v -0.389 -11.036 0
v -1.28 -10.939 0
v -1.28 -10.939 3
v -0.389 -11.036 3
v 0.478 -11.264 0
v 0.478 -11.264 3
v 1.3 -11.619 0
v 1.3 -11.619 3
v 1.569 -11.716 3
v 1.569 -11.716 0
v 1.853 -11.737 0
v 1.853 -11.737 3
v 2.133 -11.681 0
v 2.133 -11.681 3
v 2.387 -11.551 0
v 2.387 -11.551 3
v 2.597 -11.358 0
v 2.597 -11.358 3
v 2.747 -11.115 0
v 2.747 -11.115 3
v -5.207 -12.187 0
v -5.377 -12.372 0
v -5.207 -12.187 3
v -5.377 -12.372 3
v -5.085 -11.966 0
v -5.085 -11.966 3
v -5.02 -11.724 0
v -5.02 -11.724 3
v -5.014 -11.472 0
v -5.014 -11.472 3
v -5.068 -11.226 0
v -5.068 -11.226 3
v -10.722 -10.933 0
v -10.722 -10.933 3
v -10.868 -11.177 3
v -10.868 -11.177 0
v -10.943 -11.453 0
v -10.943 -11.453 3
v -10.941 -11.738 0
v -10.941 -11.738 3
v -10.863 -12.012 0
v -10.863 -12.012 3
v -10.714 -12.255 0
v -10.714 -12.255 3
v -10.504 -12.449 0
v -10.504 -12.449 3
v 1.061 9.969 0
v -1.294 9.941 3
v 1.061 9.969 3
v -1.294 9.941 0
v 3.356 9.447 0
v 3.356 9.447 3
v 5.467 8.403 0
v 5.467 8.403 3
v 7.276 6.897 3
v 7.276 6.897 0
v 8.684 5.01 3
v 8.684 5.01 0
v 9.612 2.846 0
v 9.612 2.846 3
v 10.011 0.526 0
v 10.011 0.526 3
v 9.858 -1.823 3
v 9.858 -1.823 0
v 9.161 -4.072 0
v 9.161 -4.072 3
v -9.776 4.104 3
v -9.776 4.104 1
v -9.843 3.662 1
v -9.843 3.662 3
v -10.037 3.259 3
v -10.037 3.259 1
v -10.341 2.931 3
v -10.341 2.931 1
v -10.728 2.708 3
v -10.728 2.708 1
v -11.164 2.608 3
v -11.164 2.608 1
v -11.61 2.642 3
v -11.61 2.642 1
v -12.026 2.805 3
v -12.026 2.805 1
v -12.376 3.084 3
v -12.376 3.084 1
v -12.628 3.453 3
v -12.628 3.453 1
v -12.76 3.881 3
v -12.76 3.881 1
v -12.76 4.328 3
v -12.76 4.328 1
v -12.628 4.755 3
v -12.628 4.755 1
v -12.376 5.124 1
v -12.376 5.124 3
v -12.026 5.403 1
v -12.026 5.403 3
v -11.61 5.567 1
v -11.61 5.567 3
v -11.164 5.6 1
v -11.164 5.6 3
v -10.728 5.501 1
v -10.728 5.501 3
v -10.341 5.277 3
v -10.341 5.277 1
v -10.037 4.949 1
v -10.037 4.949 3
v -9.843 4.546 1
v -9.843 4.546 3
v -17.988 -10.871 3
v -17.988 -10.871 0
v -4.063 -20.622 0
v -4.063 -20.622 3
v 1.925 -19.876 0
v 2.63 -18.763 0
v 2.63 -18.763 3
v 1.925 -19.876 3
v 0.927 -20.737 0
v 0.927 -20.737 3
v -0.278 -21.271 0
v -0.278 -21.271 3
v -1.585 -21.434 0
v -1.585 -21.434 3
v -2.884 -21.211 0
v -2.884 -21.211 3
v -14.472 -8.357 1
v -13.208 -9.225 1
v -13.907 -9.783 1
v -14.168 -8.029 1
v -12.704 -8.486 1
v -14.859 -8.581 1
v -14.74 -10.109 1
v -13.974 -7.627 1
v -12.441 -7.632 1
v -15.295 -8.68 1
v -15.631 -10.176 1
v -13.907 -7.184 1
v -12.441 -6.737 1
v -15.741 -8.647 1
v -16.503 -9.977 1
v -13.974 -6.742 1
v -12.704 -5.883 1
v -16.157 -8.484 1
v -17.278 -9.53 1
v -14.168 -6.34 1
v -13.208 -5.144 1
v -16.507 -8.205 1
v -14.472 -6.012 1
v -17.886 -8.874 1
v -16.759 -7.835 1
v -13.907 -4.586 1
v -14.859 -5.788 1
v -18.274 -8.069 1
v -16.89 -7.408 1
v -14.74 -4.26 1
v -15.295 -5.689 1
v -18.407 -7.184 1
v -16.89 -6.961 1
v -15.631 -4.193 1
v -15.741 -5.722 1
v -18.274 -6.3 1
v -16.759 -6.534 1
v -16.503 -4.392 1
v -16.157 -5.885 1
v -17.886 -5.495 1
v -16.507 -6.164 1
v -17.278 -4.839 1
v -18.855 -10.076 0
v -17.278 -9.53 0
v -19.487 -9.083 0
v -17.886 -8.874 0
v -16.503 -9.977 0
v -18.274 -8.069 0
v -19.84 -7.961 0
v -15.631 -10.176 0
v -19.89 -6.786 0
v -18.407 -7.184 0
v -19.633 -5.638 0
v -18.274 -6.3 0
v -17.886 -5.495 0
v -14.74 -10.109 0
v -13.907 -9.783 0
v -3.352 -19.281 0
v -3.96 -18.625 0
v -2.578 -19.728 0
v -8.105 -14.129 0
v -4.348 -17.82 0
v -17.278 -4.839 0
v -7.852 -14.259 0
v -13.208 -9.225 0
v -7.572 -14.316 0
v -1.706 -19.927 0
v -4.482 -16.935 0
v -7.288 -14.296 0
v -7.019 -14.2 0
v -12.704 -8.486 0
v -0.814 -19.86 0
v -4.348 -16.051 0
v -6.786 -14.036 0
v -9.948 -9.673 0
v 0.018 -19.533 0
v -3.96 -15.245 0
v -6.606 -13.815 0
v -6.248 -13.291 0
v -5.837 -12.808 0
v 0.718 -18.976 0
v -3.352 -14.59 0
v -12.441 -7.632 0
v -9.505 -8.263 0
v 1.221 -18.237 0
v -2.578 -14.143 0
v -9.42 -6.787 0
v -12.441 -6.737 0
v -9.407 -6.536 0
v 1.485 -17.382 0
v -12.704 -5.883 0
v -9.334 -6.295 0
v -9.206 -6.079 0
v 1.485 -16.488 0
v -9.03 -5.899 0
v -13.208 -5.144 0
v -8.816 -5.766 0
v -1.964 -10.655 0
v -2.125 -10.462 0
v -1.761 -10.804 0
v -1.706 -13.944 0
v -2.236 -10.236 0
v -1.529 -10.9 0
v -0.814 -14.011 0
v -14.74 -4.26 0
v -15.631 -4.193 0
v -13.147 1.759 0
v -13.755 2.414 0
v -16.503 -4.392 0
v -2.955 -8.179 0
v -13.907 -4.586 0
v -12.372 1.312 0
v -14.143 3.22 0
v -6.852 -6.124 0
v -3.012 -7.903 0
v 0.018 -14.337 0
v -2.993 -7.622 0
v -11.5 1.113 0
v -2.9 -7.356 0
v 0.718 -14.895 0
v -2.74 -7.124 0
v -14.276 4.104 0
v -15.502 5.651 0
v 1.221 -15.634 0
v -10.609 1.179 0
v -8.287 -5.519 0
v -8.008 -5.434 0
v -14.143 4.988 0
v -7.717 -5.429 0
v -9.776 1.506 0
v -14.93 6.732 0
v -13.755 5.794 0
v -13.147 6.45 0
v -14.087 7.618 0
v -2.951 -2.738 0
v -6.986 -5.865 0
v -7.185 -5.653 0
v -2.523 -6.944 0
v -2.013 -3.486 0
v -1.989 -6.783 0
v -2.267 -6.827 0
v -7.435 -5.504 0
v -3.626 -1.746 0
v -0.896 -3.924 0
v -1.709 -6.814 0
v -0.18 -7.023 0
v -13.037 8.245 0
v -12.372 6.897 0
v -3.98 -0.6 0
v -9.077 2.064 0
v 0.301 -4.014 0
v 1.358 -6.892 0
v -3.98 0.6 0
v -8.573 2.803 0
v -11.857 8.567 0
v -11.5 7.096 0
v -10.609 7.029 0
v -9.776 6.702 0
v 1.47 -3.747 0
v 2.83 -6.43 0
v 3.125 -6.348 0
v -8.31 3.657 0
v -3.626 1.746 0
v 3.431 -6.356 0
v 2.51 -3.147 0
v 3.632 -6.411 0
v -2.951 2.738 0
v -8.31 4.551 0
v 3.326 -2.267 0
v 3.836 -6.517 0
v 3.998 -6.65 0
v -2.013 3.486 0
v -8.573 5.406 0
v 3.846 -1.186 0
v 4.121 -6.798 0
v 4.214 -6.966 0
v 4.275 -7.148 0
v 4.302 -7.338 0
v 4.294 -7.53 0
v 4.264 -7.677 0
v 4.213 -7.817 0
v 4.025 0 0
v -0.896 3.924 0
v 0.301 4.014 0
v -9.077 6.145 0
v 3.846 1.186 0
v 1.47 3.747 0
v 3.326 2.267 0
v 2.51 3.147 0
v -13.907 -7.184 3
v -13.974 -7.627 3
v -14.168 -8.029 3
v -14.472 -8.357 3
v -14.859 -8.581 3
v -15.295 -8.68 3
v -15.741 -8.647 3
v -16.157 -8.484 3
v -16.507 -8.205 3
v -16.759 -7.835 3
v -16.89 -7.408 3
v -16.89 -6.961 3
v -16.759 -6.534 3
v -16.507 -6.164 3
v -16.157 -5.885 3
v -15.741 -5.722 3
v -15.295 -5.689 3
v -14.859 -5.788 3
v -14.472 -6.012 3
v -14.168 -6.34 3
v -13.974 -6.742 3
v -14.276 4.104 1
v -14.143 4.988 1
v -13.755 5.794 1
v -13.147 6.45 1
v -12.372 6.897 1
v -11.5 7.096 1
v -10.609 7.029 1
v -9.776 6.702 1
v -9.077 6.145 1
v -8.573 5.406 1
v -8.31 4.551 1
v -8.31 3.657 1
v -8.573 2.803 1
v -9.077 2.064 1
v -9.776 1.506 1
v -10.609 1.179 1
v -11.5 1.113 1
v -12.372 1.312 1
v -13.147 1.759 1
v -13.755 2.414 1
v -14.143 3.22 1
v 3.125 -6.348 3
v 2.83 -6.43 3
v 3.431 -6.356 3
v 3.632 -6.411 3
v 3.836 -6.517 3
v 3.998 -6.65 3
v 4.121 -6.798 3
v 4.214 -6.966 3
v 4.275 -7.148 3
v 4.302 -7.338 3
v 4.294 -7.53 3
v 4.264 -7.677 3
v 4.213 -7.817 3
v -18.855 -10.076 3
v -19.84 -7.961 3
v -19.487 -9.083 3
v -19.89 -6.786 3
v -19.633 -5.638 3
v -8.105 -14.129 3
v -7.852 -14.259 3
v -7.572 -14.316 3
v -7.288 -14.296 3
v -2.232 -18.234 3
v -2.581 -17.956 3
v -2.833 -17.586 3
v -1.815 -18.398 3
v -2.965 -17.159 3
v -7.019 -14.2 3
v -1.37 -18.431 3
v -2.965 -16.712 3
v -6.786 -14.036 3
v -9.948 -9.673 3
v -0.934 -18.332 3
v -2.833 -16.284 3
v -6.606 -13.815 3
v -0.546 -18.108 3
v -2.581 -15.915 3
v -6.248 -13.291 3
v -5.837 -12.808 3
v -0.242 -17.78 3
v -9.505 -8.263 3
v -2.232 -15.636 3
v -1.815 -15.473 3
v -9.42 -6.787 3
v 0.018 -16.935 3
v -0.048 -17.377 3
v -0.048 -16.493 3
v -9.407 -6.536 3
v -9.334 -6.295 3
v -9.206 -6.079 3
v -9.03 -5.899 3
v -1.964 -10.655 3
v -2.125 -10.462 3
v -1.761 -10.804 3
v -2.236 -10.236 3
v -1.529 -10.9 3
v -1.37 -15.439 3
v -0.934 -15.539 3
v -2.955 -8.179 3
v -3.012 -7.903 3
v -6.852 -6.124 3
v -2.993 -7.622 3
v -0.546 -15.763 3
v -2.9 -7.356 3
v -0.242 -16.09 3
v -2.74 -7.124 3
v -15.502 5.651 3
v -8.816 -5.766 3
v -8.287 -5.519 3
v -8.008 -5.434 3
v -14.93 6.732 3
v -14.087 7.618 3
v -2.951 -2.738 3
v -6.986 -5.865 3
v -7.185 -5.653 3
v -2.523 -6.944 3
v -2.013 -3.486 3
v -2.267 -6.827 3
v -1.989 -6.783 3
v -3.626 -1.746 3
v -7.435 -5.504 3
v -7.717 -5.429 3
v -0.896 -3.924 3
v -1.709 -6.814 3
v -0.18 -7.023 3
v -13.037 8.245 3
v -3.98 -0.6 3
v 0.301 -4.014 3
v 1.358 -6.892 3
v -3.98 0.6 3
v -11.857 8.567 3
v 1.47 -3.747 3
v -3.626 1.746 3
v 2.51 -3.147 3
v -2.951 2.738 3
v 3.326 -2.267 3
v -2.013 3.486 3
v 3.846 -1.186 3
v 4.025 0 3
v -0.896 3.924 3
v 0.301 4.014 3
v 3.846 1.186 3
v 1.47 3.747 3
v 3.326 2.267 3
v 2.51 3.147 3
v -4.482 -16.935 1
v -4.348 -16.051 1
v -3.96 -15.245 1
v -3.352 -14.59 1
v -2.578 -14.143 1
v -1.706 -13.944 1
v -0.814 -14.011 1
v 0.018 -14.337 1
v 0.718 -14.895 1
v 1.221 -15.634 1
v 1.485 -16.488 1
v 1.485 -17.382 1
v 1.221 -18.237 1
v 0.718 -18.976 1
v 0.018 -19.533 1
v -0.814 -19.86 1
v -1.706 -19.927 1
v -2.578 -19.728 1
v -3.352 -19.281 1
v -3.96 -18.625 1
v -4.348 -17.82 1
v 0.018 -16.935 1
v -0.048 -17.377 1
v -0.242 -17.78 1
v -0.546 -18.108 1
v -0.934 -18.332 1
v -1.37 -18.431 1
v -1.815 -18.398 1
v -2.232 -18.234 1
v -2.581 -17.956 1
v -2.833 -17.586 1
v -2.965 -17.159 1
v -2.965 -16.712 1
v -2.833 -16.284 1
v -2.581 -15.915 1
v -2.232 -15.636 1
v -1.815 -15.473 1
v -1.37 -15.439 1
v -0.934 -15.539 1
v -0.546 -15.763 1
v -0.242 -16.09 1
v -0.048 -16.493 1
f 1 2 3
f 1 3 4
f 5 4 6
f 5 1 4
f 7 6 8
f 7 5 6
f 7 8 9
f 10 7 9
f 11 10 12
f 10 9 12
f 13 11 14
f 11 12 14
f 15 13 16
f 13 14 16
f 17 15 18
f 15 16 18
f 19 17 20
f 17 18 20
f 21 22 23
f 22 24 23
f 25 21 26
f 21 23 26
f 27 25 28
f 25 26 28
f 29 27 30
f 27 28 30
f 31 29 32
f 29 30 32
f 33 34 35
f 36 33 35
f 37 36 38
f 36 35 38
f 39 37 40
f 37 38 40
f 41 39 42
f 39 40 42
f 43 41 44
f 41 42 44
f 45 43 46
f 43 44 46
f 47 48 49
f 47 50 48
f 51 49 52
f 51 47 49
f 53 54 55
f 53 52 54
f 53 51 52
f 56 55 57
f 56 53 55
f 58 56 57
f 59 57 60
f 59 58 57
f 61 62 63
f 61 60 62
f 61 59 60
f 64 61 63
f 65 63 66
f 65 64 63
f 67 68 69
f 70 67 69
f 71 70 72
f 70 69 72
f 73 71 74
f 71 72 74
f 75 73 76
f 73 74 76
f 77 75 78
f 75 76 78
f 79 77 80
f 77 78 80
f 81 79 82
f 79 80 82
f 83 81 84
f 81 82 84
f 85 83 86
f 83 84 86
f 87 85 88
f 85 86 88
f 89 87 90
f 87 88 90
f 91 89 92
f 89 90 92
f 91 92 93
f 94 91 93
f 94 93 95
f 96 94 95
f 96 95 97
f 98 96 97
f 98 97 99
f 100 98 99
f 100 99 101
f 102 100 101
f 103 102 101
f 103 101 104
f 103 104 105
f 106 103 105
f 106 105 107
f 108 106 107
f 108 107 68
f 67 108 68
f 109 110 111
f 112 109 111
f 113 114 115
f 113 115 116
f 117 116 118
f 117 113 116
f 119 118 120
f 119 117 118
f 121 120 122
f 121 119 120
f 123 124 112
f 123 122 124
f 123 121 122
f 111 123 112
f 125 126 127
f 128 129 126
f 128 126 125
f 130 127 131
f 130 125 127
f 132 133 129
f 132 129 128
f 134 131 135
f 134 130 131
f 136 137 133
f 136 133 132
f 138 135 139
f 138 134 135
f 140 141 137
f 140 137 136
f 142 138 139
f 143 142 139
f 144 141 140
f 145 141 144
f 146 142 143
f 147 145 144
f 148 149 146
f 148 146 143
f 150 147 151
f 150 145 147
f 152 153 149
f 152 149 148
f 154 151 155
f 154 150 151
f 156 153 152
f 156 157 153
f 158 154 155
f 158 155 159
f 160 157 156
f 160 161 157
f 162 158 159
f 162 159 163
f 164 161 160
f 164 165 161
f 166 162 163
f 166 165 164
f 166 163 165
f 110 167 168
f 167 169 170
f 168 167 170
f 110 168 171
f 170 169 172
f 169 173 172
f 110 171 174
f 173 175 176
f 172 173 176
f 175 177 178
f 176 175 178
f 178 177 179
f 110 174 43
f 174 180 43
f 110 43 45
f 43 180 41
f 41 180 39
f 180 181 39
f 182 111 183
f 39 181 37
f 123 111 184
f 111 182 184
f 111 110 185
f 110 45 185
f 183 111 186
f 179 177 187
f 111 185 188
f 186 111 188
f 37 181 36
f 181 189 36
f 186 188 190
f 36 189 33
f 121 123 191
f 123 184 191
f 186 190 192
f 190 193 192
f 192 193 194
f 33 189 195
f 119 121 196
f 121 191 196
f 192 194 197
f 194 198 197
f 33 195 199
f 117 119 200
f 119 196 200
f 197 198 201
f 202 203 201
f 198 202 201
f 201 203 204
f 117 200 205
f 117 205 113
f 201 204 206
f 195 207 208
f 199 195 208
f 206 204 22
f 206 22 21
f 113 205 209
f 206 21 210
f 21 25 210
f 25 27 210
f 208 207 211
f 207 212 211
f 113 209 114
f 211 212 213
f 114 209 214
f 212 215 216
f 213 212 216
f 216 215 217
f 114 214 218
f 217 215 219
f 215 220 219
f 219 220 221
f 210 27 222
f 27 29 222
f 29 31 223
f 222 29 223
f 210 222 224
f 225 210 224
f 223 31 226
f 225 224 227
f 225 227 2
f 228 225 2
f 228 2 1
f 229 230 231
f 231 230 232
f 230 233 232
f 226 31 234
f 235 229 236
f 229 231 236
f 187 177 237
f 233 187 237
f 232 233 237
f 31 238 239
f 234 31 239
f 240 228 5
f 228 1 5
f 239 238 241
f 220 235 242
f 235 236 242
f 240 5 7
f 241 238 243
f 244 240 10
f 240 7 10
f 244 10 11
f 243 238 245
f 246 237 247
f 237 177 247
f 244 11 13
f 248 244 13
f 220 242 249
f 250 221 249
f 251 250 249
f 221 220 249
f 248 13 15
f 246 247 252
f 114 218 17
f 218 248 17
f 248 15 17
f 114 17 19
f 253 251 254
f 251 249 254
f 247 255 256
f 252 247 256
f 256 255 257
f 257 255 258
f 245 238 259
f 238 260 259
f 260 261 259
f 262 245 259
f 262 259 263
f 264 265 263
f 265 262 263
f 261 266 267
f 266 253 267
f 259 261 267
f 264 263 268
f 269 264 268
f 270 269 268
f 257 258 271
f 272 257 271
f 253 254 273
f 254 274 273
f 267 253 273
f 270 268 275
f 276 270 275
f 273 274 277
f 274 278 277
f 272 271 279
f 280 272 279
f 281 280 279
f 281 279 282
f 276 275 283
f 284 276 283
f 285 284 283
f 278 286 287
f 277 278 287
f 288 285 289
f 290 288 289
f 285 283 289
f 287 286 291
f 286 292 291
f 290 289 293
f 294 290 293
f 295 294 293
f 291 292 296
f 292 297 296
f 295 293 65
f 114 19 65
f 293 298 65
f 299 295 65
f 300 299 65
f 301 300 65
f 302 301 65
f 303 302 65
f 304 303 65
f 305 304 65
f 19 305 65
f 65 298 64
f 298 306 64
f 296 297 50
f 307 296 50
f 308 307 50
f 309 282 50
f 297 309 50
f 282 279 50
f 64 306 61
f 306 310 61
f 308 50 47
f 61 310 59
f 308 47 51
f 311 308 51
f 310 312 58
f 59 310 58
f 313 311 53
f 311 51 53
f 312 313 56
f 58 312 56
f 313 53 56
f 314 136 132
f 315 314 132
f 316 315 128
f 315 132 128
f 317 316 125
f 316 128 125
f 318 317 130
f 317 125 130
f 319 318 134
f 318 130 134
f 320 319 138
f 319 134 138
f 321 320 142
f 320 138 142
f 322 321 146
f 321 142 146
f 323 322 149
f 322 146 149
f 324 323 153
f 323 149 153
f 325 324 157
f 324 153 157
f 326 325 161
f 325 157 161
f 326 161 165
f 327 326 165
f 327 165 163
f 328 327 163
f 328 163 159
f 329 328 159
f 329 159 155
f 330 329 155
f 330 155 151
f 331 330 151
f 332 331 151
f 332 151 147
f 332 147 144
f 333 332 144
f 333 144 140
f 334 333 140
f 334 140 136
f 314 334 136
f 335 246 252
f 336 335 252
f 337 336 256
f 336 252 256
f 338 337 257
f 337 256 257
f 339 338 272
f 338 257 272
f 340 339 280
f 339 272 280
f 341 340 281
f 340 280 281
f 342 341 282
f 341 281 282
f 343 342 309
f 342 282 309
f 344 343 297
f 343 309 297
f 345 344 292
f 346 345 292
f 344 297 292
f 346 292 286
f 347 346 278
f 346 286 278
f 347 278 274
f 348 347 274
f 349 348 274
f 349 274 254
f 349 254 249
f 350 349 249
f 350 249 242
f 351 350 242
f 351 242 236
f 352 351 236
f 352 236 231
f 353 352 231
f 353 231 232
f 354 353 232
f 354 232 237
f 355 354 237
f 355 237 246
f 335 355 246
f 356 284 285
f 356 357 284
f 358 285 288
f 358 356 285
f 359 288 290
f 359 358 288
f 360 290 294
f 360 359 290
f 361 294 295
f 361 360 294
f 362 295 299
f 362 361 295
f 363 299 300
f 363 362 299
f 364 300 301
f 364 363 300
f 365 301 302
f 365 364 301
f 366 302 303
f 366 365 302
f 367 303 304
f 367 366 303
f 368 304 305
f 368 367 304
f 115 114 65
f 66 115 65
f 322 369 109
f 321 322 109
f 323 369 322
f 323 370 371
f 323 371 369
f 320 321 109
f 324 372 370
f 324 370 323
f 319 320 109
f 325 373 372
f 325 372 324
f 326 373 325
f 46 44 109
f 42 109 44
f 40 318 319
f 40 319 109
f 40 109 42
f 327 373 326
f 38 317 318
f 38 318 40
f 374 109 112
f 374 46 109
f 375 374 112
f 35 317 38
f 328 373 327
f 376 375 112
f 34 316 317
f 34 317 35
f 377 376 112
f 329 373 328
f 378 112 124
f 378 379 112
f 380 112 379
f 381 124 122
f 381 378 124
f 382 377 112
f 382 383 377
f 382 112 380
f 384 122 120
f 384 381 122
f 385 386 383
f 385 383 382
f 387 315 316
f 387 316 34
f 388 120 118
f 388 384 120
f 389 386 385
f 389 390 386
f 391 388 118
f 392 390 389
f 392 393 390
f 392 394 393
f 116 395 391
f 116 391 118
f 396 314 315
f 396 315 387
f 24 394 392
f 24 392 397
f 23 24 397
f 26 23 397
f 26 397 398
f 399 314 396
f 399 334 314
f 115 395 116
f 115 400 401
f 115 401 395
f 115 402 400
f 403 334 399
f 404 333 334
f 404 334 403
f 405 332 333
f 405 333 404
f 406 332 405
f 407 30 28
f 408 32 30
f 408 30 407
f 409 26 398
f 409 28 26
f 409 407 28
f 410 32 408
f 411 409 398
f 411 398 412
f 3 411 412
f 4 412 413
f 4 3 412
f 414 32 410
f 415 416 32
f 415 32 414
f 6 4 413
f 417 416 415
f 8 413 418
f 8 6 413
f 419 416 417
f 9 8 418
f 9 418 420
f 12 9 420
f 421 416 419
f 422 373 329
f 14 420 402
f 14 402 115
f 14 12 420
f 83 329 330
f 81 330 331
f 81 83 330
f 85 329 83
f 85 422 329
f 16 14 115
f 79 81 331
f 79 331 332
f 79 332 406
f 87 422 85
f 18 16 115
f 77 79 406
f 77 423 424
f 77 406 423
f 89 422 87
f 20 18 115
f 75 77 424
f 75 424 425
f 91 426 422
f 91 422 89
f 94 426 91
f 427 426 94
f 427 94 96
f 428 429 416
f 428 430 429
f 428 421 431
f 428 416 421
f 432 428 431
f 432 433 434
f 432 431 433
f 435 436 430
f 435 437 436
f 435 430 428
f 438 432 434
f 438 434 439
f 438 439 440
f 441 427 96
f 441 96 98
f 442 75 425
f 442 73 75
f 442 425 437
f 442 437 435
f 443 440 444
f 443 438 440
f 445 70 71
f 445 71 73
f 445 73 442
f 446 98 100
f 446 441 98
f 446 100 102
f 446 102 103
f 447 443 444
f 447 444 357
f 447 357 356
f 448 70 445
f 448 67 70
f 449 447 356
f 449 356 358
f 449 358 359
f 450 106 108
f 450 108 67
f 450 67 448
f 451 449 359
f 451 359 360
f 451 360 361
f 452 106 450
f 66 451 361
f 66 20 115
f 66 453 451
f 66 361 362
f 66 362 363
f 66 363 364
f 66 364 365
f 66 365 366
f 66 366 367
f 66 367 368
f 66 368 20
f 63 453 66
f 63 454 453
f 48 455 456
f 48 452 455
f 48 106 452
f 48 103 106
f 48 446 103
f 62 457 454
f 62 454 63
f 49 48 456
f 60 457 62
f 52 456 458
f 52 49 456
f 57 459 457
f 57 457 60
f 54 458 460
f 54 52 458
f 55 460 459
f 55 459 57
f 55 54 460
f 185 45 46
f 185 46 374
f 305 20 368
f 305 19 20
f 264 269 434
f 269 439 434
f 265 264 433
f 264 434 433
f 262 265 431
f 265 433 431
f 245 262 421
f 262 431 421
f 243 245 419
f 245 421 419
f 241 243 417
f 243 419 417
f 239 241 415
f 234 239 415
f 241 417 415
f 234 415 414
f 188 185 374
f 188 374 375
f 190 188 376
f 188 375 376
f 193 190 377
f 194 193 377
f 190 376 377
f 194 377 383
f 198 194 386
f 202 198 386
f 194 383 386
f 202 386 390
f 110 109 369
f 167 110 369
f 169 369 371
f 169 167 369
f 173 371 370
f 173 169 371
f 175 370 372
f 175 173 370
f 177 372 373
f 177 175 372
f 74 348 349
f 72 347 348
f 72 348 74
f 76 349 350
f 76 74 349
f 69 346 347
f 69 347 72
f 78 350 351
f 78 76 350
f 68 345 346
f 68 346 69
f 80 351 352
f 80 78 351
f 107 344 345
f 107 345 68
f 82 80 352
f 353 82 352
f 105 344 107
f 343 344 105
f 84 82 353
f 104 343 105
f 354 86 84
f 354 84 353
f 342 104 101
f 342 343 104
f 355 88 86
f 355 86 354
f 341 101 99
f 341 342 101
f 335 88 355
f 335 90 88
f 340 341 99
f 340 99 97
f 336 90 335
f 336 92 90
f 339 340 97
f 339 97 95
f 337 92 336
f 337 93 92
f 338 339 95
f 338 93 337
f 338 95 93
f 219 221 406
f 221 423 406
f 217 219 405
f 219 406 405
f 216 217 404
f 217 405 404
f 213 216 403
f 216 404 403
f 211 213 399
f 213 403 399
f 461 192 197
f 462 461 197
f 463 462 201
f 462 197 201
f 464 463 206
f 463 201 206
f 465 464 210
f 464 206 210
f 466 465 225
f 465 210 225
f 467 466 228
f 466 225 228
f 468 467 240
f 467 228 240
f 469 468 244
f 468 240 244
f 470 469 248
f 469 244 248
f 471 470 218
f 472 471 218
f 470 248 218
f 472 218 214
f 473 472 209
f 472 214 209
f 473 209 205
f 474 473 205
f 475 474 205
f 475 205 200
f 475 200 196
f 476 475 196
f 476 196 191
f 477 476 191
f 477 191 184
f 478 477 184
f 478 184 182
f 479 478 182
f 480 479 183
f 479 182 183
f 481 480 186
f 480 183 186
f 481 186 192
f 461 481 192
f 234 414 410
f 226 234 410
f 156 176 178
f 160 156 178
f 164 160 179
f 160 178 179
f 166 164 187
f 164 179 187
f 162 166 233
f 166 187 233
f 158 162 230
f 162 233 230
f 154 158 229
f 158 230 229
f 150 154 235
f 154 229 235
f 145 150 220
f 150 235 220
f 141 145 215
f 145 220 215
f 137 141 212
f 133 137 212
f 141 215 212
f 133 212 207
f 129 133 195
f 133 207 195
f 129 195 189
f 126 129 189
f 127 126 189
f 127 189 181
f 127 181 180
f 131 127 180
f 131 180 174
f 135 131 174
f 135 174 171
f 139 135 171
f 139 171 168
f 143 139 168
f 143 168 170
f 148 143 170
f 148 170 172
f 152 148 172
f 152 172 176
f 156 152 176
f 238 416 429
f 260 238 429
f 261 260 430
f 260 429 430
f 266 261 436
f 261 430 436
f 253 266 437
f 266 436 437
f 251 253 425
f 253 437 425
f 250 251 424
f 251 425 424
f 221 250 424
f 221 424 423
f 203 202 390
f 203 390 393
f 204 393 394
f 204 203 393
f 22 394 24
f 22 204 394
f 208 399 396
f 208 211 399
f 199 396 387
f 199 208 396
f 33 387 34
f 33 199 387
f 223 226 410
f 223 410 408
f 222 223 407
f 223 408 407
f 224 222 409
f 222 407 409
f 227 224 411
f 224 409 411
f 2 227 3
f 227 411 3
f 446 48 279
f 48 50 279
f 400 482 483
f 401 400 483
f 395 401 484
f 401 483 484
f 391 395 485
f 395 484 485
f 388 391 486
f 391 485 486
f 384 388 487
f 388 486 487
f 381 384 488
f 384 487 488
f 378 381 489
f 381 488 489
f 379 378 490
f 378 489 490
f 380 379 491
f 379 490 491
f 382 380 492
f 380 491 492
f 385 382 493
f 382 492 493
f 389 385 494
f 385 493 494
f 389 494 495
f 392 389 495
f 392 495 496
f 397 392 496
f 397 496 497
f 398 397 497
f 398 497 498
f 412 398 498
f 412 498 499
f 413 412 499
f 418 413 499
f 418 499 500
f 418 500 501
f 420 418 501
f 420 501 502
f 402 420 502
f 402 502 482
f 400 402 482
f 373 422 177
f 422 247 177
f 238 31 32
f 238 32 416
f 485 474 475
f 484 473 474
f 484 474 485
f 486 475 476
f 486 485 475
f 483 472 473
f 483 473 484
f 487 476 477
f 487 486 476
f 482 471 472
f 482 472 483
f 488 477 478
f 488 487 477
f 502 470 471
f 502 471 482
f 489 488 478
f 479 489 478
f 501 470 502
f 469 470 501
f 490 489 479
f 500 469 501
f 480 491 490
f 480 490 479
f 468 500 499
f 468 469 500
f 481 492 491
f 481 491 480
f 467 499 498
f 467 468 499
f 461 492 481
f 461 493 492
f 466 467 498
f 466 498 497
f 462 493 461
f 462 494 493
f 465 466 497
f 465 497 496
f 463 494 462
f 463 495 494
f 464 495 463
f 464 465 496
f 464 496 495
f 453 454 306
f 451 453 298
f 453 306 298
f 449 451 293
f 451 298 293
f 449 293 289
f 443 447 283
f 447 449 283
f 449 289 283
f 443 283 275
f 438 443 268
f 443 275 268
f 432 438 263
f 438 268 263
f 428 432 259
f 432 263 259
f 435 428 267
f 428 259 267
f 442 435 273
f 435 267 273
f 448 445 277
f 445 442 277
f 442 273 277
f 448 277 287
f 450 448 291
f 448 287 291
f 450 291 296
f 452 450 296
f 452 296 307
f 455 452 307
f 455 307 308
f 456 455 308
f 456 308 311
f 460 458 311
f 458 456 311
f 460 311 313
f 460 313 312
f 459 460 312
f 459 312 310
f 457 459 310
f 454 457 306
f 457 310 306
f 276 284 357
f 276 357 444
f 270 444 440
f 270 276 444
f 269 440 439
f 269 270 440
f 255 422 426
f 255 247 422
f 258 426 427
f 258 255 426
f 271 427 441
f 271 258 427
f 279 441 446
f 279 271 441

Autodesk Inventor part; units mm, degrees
ref_plane "YZ Plane" through (0, 0, 0) normal (1, 0, 0) x (0, 1, 0)
ref_plane "XZ Plane" through (0, 0, 0) normal (0, 1, 0) x (-1, 0, 0)
ref_plane "XY Plane" through (0, 0, 0) normal (0, 0, 1) x (1, 0, 0)
sketch "スケッチ1" plane through (0, 0, 0) normal (0, 0, 1) x (1, 0, 0)
  circle A0 centre (0, 0) radius 4.025
  line L0 (0, 0) -> (0, -4.025)
  line L1 (0, 0) -> (-1.4816, -16.9353)
  circle A1 centre (-1.4816, -16.9353) radius 1.5
  line L2 (0, 0) -> (-15.4072, -7.1845)
  circle A2 centre (-15.4072, -7.1845) radius 1.5
  line L3 (0, 0) -> (-11.2763, 4.1042)
  circle A3 centre (-11.2763, 4.1042) radius 1.5
  circle A4 centre (0, 0) radius 7.025
  circle A5 centre (0, 0) radius 10.025
  circle A6 centre (-11.2763, 4.1042) radius 4.5
  circle A7 centre (-15.4072, -7.1845) radius 4.5
  circle A8 centre (-1.4816, -16.9353) radius 4.5
  line L4 (-15.5023, 5.6507) -> (-19.6332, -5.6381)
  line L5 (-17.9883, -10.8707) -> (-4.0627, -20.6215)
  line L6 (2.6304, -18.7632) -> (9.1607, -4.072)
  line L7 (-1.2936, 9.9412) -> (-12.3185, 8.5066)
  point P0 (-11.857, 8.5666)
  dimension "d0" = 8.05
  dimension "d1" = 5
  dimension "d2" = 17
  dimension "d3" = 3
  dimension "d4" = 17
  dimension "d5" = 3
  dimension "d6" = 60
  dimension "d7" = 12
  dimension "d8" = 3
  dimension "d9" = 45
  dimension "d12" = 3
  dimension "d18" = 3
  dimension "d19" = 3
  dimension "d20" = 3
  dimension "d21" = 3
extrude "押し出し1" add sketch "スケッチ1" along normal blind 3 contours A0 L3 A4 L1 | L1 A4 L2 A0 | A0 L2 A4 L3 | A4 L3 A6 A5 L1 | L1 A5 L2 A4 | A4 L2 A5 A6 L3 | A5 L6 A8 L1 | L1 A8 L5 A7 L2 A5 | A6 A5 L3 | L3 A5 A6 | L2 A7 L4 A6 A5 | A8 | A5 A6 | A7 | A6 L7 A5
sketch "スケッチ2" plane through (0, 0, 0) normal (0, 0, -1) x (-1, 0, 0)
  circle A0 centre (11.2763, 4.1042) radius 1.5 projected
  circle A1 centre (15.4072, -7.1845) radius 1.5 projected
  circle A2 centre (1.4816, -16.9353) radius 1.5 projected
  circle A3 centre (11.2763, 4.1042) radius 3
  circle A4 centre (15.4072, -7.1845) radius 3
  circle A5 centre (1.4816, -16.9353) radius 3
  point P0 (0, 0)
  dimension "d13" = 6
  dimension "d14" = 6
  dimension "d15" = 6
extrude "押し出し2" cut sketch "スケッチ2" against normal blind 1
sketch "スケッチ3" plane through (0, 0, 0) normal (0, 0, -1) x (-1, 0, 0)
  circle A0 centre (11.2763, 4.1042) radius 3 projected
  circle A1 centre (15.4072, -7.1845) radius 3 projected
  circle A2 centre (1.4816, -16.9353) radius 3 projected
  circle A3 centre (0, 0) radius 4.025 projected
  arc A4 (17.9883, -10.8707) -> (19.6332, -5.6381) centre (15.4072, -7.1845) ccw projected
  line L0 (15.5023, 5.6507) -> (19.6332, -5.6381) projected
  arc A5 (15.5023, 5.6507) -> (11.857, 8.5666) centre (11.2763, 4.1042) ccw projected
  line L1 (1.2936, 9.9412) -> (11.857, 8.5666) projected
  arc A6 (1.2936, 9.9412) -> (-9.1607, -4.072) centre (0, 0) ccw projected
  line L2 (-2.6304, -18.7632) -> (-9.1607, -4.072) projected
  arc A7 (-2.6304, -18.7632) -> (4.0627, -20.6215) centre (1.4816, -16.9353) ccw projected
  line L3 (17.9883, -10.8707) -> (4.0627, -20.6215) projected
  arc A8 (0.9065, 6.9663) -> (-6.4194, -2.8535) centre (0, 0) ccw
  line L4 (0.9065, 6.9663) -> (11.4699, 5.5917)
  arc A9 (12.685, 4.6197) -> (11.4699, 5.5917) centre (11.2763, 4.1042) ccw
  line L5 (12.685, 4.6197) -> (16.8159, -6.669)
  arc A10 (16.2676, -8.4132) -> (16.8159, -6.669) centre (15.4072, -7.1845) ccw
  line L6 (16.2676, -8.4132) -> (2.342, -18.164)
  arc A11 (0.111, -17.5446) -> (2.342, -18.164) centre (1.4816, -16.9353) ccw
  line L7 (0.111, -17.5446) -> (-6.4194, -2.8535)
  circle A12 centre (0, 0) radius 7.025
  circle A13 centre (1.4816, -16.9353) radius 6
  circle A14 centre (15.4072, -7.1845) radius 6
  circle A15 centre (11.2763, 4.1042) radius 6
  line L8 (0, 0) -> (15.4072, -7.1845) construction
  line L9 (-0.6339, -1.3595) -> (14.7733, -8.544)
  line L10 (16.0412, -5.825) -> (0.6339, 1.3595)
  arc A16 (0.6339, 1.3595) -> (-0.6339, -1.3595) centre (0, 0) ccw
  arc A17 (14.7733, -8.544) -> (16.0412, -5.825) centre (15.4072, -7.1845) ccw
  line L11 (1.4816, -16.9353) -> (6.3668, -2.9689) construction
  line L12 (2.8975, -17.4306) -> (7.7827, -3.4641)
  line L13 (4.9509, -2.4736) -> (0.0658, -16.4401)
  arc A18 (0.0658, -16.4401) -> (2.8975, -17.4306) centre (1.4816, -16.9353) ccw
  arc A19 (7.7827, -3.4641) -> (4.9509, -2.4736) centre (6.3668, -2.9689) ccw
  point P0 (7.7036, -3.5923)
  point P1 (3.9242, -9.9521)
  point P2 (7.2354, -5.029)
  point P3 (4.8156, -11.9469)
  point P4 (7.1009, -14.8319)
  point P5 (11.5088, -11.7454)
  point P6 (9.5081, -6.0888)
  point P7 (1.9838, -10.9564)
  point P8 (3.735, -5.9498)
  point P9 (-6.4194, -2.8535)
  point P10 (-2.2488, -12.236)
  dimension "d22" = 3
  dimension "d23" = 3
  dimension "d24" = 3
  dimension "d25" = 3
  dimension "d26" = 3
  dimension "d27" = 3
  dimension "d28" = 3
extrude "押し出し3" cut sketch "スケッチ3" against normal blind 10 contours A12 L13 A13 L7 | A14 L6 A13 L12 L9
fillet "フィレット1" radius 1.05 9 edges at (-1.9838, -10.9564, 1.5) (6.4194, -2.8535, 1.5) (2.2488, -12.236, 1.5) (-3.735, -5.9498, 1.5) (-9.5081, -6.0888, 1.5) (-7.2354, -5.029, 1.5) (-4.8156, -11.9469, 1.5) (-7.1009, -14.8319, 1.5) (-11.5088, -11.7454, 1.5)
properties part number "アーム揺動節抑え" material "アルミニウム 2014-T4"
